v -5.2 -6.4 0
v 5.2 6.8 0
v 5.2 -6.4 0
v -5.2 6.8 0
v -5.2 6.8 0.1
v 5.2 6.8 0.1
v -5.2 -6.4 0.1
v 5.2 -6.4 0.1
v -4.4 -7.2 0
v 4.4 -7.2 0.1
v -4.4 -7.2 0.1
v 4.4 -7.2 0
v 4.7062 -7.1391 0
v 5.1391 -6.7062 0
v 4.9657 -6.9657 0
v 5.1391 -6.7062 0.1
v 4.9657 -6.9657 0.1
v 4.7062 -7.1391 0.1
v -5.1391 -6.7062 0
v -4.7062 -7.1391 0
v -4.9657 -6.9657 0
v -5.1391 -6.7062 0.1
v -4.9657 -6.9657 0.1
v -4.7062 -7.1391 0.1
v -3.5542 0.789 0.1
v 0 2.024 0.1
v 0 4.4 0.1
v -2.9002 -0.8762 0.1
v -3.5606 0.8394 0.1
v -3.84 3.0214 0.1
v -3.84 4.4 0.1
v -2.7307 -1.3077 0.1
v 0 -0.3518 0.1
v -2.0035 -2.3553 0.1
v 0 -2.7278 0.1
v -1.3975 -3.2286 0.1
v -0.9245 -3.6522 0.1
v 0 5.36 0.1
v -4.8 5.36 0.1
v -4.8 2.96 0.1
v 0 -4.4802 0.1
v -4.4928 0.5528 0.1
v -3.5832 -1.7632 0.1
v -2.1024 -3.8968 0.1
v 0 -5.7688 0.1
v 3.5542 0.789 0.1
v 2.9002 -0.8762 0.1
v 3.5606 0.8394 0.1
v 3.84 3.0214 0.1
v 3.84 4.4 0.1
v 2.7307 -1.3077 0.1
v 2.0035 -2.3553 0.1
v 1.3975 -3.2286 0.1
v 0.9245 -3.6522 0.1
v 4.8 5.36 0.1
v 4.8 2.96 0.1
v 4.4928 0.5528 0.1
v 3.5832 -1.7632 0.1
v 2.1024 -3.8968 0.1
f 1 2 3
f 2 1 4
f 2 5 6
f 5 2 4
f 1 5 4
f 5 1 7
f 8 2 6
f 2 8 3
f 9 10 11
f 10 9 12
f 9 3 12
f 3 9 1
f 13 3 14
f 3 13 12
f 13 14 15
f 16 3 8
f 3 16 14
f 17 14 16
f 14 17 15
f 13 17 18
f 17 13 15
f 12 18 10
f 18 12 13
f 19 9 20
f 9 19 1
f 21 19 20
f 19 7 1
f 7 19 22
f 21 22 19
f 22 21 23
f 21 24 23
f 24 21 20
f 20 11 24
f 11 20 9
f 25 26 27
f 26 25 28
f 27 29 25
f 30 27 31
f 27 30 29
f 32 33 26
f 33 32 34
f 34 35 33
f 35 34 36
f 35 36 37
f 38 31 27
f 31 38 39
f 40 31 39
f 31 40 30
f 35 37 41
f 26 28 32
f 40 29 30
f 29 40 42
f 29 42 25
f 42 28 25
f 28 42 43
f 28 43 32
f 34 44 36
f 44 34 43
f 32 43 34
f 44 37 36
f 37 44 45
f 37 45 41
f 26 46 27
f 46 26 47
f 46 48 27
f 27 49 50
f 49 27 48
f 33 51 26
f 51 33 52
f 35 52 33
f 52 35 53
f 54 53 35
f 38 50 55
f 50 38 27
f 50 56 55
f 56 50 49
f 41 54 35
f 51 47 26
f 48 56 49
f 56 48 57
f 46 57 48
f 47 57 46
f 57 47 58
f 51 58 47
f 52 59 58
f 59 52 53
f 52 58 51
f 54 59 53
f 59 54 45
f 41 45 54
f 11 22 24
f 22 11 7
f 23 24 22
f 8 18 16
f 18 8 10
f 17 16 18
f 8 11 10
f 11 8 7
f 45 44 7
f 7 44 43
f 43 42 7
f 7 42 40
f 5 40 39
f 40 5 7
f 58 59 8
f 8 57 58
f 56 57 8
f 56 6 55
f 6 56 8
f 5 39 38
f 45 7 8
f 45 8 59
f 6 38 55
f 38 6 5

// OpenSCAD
// file: ../p/1-4cyli.scad
use <../lib.scad>
function ldraw_lib__1_4cyli() = [
// 0 Cylinder 0.25
// 0 Name: 1-4cyli.dat
// 0 Author: James Jessiman
// 0 !LDRAW_ORG Primitive UPDATE 2012-01
// 0 !LICENSE Licensed under CC BY 4.0 : see CAreadme.txt
// 
// 0 BFC CERTIFY CCW
  [0,"BFC","CERTIFY"],
  [0,"BFC","CCW"],
// 
// 0 !HISTORY 2002-03-23 [sbliss] Added BFC statement.
// 0 !HISTORY 2002-04-25 [PTadmin] Official Update 2002-02
// 0 !HISTORY 2007-06-22 [PTadmin] Header formatted for Contributor Agreement
// 0 !HISTORY 2008-07-01 [PTadmin] Official Update 2008-01
// 0 !HISTORY 2012-02-16 [Philo] Changed to CCW
// 0 !HISTORY 2012-03-30 [PTadmin] Official Update 2012-01
// 
// 
// 4 16 1 1 0 0.9239 1 0.3827 0.9239 0 0.3827 1 0 0
  [4,16,1,1,0,0.9239,1,0.3827,0.9239,0,0.3827,1,0,0],
// 5 24 1 0 0 1 1 0 0.9239 0 0.3827 1 0 -1
  [5,24,1,0,0,1,1,0,0.9239,0,0.3827,1,0,-1],
// 4 16 0.9239 1 0.3827 0.7071 1 0.7071 0.7071 0 0.7071 0.9239 0 0.3827
  [4,16,0.9239,1,0.3827,0.7071,1,0.7071,0.7071,0,0.7071,0.9239,0,0.3827],
// 5 24 0.9239 0 0.3827 0.9239 1 0.3827 0.7071 0 0.7071 1 0 0
  [5,24,0.9239,0,0.3827,0.9239,1,0.3827,0.7071,0,0.7071,1,0,0],
// 4 16 0.7071 1 0.7071 0.3827 1 0.9239 0.3827 0 0.9239 0.7071 0 0.7071
  [4,16,0.7071,1,0.7071,0.3827,1,0.9239,0.3827,0,0.9239,0.7071,0,0.7071],
// 5 24 0.7071 0 0.7071 0.7071 1 0.7071 0.3827 0 0.9239 0.9239 0 0.3827
  [5,24,0.7071,0,0.7071,0.7071,1,0.7071,0.3827,0,0.9239,0.9239,0,0.3827],
// 4 16 0.3827 1 0.9239 0 1 1 0 0 1 0.3827 0 0.9239
  [4,16,0.3827,1,0.9239,0,1,1,0,0,1,0.3827,0,0.9239],
// 5 24 0.3827 0 0.9239 0.3827 1 0.9239 0 0 1 0.7071 0 0.7071
  [5,24,0.3827,0,0.9239,0.3827,1,0.9239,0,0,1,0.7071,0,0.7071],
// 5 24 0 0 1 0 1 1 0.3827 0 0.9239 -1 0 1
  [5,24,0,0,1,0,1,1,0.3827,0,0.9239,-1,0,1],
];
module ldraw_lib__1_4cyli(step=0, col=false, unit=2/5, alt=false, line=0.2, solid=!$preview)
    makepoly(ldraw_lib__1_4cyli(), step=step, col=col, unit=unit, alt=alt, line=line, solid=solid);
ldraw_lib__1_4cyli(line=0.2);
// file: s/3238s02.scad
use <../../lib.scad>
use <../../p/1-4chrd.scad>
use <../../p/1-4cyli.scad>
function ldraw_lib__s__3238s02() = [
// 0 ~Sticker Minifig Vest - box
// 0 Name: s\3238s02.dat
// 0 Author: Alex Taylor [anathema]
// 0 !LDRAW_ORG Subpart UPDATE 2020-03
// 0 !LICENSE Licensed under CC BY 4.0 : see CAreadme.txt
// 
// 0 BFC CERTIFY CCW
  [0,"BFC","CERTIFY"],
  [0,"BFC","CCW"],
// 
// 0 !HISTORY 2010-04-05 [PTadmin] Official Update 2010-01
// 0 !HISTORY 2020-11-01 [MMR1988] Fixed t-junctions
// 0 !HISTORY 2020-12-29 [PTadmin] Official Update 2020-03
// 
// 
// 4 16 13 0 17 13 0 -16 -13 0 -16 -13 0 17
  [4,16,13,0,17,13,0,-16,-13,0,-16,-13,0,17],
// 4 16 -13 -0.25 17 13 -0.25 17 13 0 17 -13 0 17
  [4,16,-13,-0.25,17,13,-0.25,17,13,0,17,-13,0,17],
// 4 16 -13 0 17 -13 0 -16 -13 -0.25 -16 -13 -0.25 17
  [4,16,-13,0,17,-13,0,-16,-13,-0.25,-16,-13,-0.25,17],
// 4 16 13 -0.25 17 13 -0.25 -16 13 0 -16 13 0 17
  [4,16,13,-0.25,17,13,-0.25,-16,13,0,-16,13,0,17],
// 4 16 -11 0 -18 11 0 -18 11 -0.25 -18 -11 -0.25 -18
  [4,16,-11,0,-18,11,0,-18,11,-0.25,-18,-11,-0.25,-18],
// 4 16 -13 0 -16 13 0 -16 11 0 -18 -11 0 -18
  [4,16,-13,0,-16,13,0,-16,11,0,-18,-11,0,-18],
// 1 16 11 0 -16 0 0 2 0 -1 0 -2 0 0 1-4chrd.dat
  [1,16,11,0,-16,0,0,2,0,-1,0,-2,0,0, ldraw_lib__1_4chrd()],
// 1 16 11 0 -16 2 0 0 0 -0.25 0 0 0 -2 1-4cyli.dat
  [1,16,11,0,-16,2,0,0,0,-0.25,0,0,0,-2, ldraw_lib__1_4cyli()],
// 1 16 -11 0 -16 0 0 -2 0 -1 0 -2 0 0 1-4chrd.dat
  [1,16,-11,0,-16,0,0,-2,0,-1,0,-2,0,0, ldraw_lib__1_4chrd()],
// 1 16 -11 0 -16 -2 0 0 0 -0.25 0 0 0 -2 1-4cyli.dat
  [1,16,-11,0,-16,-2,0,0,0,-0.25,0,0,0,-2, ldraw_lib__1_4cyli()],
];
module ldraw_lib__s__3238s02(step=0, col=false, unit=2/5, alt=false, line=0.2, solid=!$preview)
    makepoly(ldraw_lib__s__3238s02(), step=step, col=col, unit=unit, alt=alt, line=line, solid=solid);
ldraw_lib__s__3238s02(line=0.2);
// file: s/003238s5.scad
use <../../lib.scad>
function ldraw_lib__s__003238s5() = [
// 0 ~Green Chevron on Yellow Pattern - 1/2
// 0 Name: s\003238s5.dat
// 0 Author: Alex Taylor [anathema]
// 0 !LDRAW_ORG Subpart UPDATE 2020-03
// 0 !LICENSE Licensed under CC BY 4.0 : see CAreadme.txt
// 
// 0 BFC CERTIFY CCW
  [0,"BFC","CERTIFY"],
  [0,"BFC","CCW"],
// 
// 0 !HISTORY 2010-04-05 [PTadmin] Official Update 2010-01
// 0 !HISTORY 2020-10-30 [MMR1988] Removed T-junctions
// 0 !HISTORY 2020-12-29 [PTadmin] Official Update 2020-03
// 
// 
// 4 2 -14.809 0 -5.046 -12.084 0 -11.984 0 0 0.1 0 0 10
  [4,2,-14.809,0,-5.046,-12.084,0,-11.984,0,0,0.1,0,0,10],
// 3 2 0 0 10 -14.836 0 -4.836 -14.809 0 -5.046
  [3,2,0,0,10,-14.836,0,-4.836,-14.809,0,-5.046],
// 4 14 -16 0 10 -16 0 4.256 -14.836 0 -4.836 0 0 10
  [4,14,-16,0,10,-16,0,4.256,-14.836,0,-4.836,0,0,10],
// 4 14 -11.378 0 -13.782 -8.348 0 -18.147 0 0 -9.799 0 0 0.1
  [4,14,-11.378,0,-13.782,-8.348,0,-18.147,0,0,-9.799,0,0,0.1],
// 4 2 0 0 -9.799 -8.348 0 -18.147 -5.823 0 -21.786 0 0 -19.699
  [4,2,0,0,-9.799,-8.348,0,-18.147,-5.823,0,-21.786,0,0,-19.699],
// 3 2 0 0 -19.699 -5.823 0 -21.786 -3.852 0 -23.551
  [3,2,0,0,-19.699,-5.823,0,-21.786,-3.852,0,-23.551],
// 4 16 0 0 10 0 0 14 -20 0 14 -16 0 10
  [4,16,0,0,10,0,0,14,-20,0,14,-16,0,10],
// 4 16 -16 0 4.256 -16 0 10 -20 0 14 -20 0 4
  [4,16,-16,0,4.256,-16,0,10,-20,0,14,-20,0,4],
// 3 14 0 0 -19.699 -3.852 0 -23.551 0 0 -27.001
  [3,14,0,0,-19.699,-3.852,0,-23.551,0,0,-27.001],
// 3 14 0 0 0.1 -12.084 0 -11.984 -11.378 0 -13.782
  [3,14,0,0,0.1,-12.084,0,-11.984,-11.378,0,-13.782],
// 4 16 -20 0 4 -18.72 0 -6.03 -14.836 0 -4.836 -16 0 4.256
  [4,16,-20,0,4,-18.72,0,-6.03,-14.836,0,-4.836,-16,0,4.256],
// 3 16 -14.836 0 -4.836 -18.72 0 -6.03 -14.809 0 -5.046
  [3,16,-14.836,0,-4.836,-18.72,0,-6.03,-14.809,0,-5.046],
// 4 16 -18.72 0 -6.03 -14.93 0 -15.68 -12.084 0 -11.984 -14.809 0 -5.046
  [4,16,-18.72,0,-6.03,-14.93,0,-15.68,-12.084,0,-11.984,-14.809,0,-5.046],
// 3 16 -12.084 0 -11.984 -14.93 0 -15.68 -11.378 0 -13.782
  [3,16,-12.084,0,-11.984,-14.93,0,-15.68,-11.378,0,-13.782],
// 4 16 -8.348 0 -18.147 -14.93 0 -15.68 -8.76 0 -24.57 -5.823 0 -21.786
  [4,16,-8.348,0,-18.147,-14.93,0,-15.68,-8.76,0,-24.57,-5.823,0,-21.786],
// 3 16 -11.378 0 -13.782 -14.93 0 -15.68 -8.348 0 -18.147
  [3,16,-11.378,0,-13.782,-14.93,0,-15.68,-8.348,0,-18.147],
// 4 16 -3.852 0 -23.551 -5.823 0 -21.786 -8.76 0 -24.57 0 0 -32.37
  [4,16,-3.852,0,-23.551,-5.823,0,-21.786,-8.76,0,-24.57,0,0,-32.37],
// 3 16 -3.852 0 -23.551 0 0 -32.37 0 0 -27.001
  [3,16,-3.852,0,-23.551,0,0,-32.37,0,0,-27.001],
];
module ldraw_lib__s__003238s5(step=0, col=false, unit=2/5, alt=false, line=0.2, solid=!$preview)
    makepoly(ldraw_lib__s__003238s5(), step=step, col=col, unit=unit, alt=alt, line=line, solid=solid);
ldraw_lib__s__003238s5(line=0.2);
// file: ../p/1-4chrd.scad
use <../lib.scad>
function ldraw_lib__1_4chrd() = [
// 0 Chord 0.25
// 0 Name: 1-4chrd.dat
// 0 Author: Max Martin Richter [MMR1988]
// 0 !LDRAW_ORG Primitive UPDATE 2023-05
// 0 !LICENSE Licensed under CC BY 4.0 : see CAreadme.txt
// 
// 0 BFC CERTIFY CCW
  [0,"BFC","CERTIFY"],
  [0,"BFC","CCW"],
// 
// 0 !HISTORY 2004-04-22 [PTadmin] Official Update 2004-02
// 0 !HISTORY 2007-10-09 [PTadmin] Header formatted for Contributor Agreement
// 0 !HISTORY 2008-07-01 [PTadmin] Official Update 2008-01
// 0 !HISTORY 2012-08-02 [MMR1988] Re-creation with PrimGen2 and Rectifier
// 0 !HISTORY 2012-08-09 [PTadmin] Official Update 2012-02
// 0 !HISTORY 2023-10-27 [OrionP] Change author to MMR1988 from hafhead
// 0 !HISTORY 2023-10-31 [OrionP] Official Update 2023-05
// 
// 4 16 0.9239 0 0.3827 0.3827 0 0.9239 0 0 1 1 0 0
  [4,16,0.9239,0,0.3827,0.3827,0,0.9239,0,0,1,1,0,0],
// 3 16 0.7071 0 0.7071 0.3827 0 0.9239 0.9239 0 0.3827
  [3,16,0.7071,0,0.7071,0.3827,0,0.9239,0.9239,0,0.3827],
];
module ldraw_lib__1_4chrd(step=0, col=false, unit=2/5, alt=false, line=0.2, solid=!$preview)
    makepoly(ldraw_lib__1_4chrd(), step=step, col=col, unit=unit, alt=alt, line=line, solid=solid);
ldraw_lib__1_4chrd(line=0.2);
// main file
use <../lib.scad>
use <../p/1-4chrd.scad>
use <s/003238s5.scad>
use <s/3238s02.scad>
function ldraw_lib__003238o() = [
// 0 Sticker Minifig Vest with Shield with Green Chevrons on Light Grey Background
// 0 Name: 003238o.dat
// 0 Author: Alex Taylor [anathema]
// 0 !LDRAW_ORG Part UPDATE 2020-03
// 0 !LICENSE Licensed under CC BY 4.0 : see CAreadme.txt
// 
// 0 BFC CERTIFY CCW
  [0,"BFC","CERTIFY"],
  [0,"BFC","CCW"],
// 
// 0 !KEYWORDS Castle, part 3840, set 375-2, set 6075-2
// 
// 0 !HISTORY 2010-04-05 [PTadmin] Official Update 2010-01
// 0 !HISTORY 2019-09-08 [anathema] Corrected colour of back
// 0 !HISTORY 2020-11-01 [MMR1988] Fixed overlapping and t-junctions
// 0 !HISTORY 2020-12-29 [PTadmin] Official Update 2020-03
// 
// 
// 1 16 0 0 0 1 0 0 0 1 0 0 0 1 s\3238s02.dat
  [1,16,0,0,0,1,0,0,0,1,0,0,0,1, ldraw_lib__s__3238s02()],
// 1 7 0 -0.25 5 0.6 0 0 0 1 0 0 0 0.6 s\003238s5.dat
  [1,7,0,-0.25,5,0.6,0,0,0,1,0,0,0,0.6, ldraw_lib__s__003238s5()],
// 1 7 0 -0.25 5 -0.6 0 0 0 1 0 0 0 0.6 s\003238s5.dat
  [1,7,0,-0.25,5,-0.6,0,0,0,1,0,0,0,0.6, ldraw_lib__s__003238s5()],
// 1 7 -11 -0.25 -16 -2 0 0 0 1 0 0 0 -2 1-4chrd.dat
  [1,7,-11,-0.25,-16,-2,0,0,0,1,0,0,0,-2, ldraw_lib__1_4chrd()],
// 1 7 11 -0.25 -16 0 0 2 0 1 0 -2 0 0 1-4chrd.dat
  [1,7,11,-0.25,-16,0,0,2,0,1,0,-2,0,0, ldraw_lib__1_4chrd()],
// 4 7 -11 -.25 -18 11 -.25 -18 13 -.25 -16 -13 -.25 -16
  [4,7,-11,-.25,-18,11,-.25,-18,13,-.25,-16,-13,-.25,-16],
// 3 7 0 -.25 -14.422 -5.256 -.25 -9.742 -13 -.25 -16
  [3,7,0,-.25,-14.422,-5.256,-.25,-9.742,-13,-.25,-16],
// 3 7 -13 -.25 -16 -5.256 -.25 -9.742 -8.958 -.25 -4.408
  [3,7,-13,-.25,-16,-5.256,-.25,-9.742,-8.958,-.25,-4.408],
// 3 7 -8.958 -.25 -4.408 -11.232 -.25 1.382 -13 -.25 -16
  [3,7,-8.958,-.25,-4.408,-11.232,-.25,1.382,-13,-.25,-16],
// 3 7 -13 -.25 -16 -11.232 -.25 1.382 -12 -.25 7.4
  [3,7,-13,-.25,-16,-11.232,-.25,1.382,-12,-.25,7.4],
// 4 7 -12 -.25 7.4 -12 -.25 13.4 -13 -.25 17 -13 -.25 -16
  [4,7,-12,-.25,7.4,-12,-.25,13.4,-13,-.25,17,-13,-.25,-16],
// 3 7 8.958 -.25 -4.408 5.256 -.25 -9.742 13 -.25 -16
  [3,7,8.958,-.25,-4.408,5.256,-.25,-9.742,13,-.25,-16],
// 3 7 13 -.25 -16 11.232 -.25 1.382 8.958 -.25 -4.408
  [3,7,13,-.25,-16,11.232,-.25,1.382,8.958,-.25,-4.408],
// 3 7 12 -.25 7.4 11.232 -.25 1.382 13 -.25 -16
  [3,7,12,-.25,7.4,11.232,-.25,1.382,13,-.25,-16],
// 4 7 13 -.25 -16 13 -.25 17 12 -.25 13.4 12 -.25 7.4
  [4,7,13,-.25,-16,13,-.25,17,12,-.25,13.4,12,-.25,7.4],
// 3 7 -13 -.25 17 -12 -.25 13.4 0 -.25 13.4
  [3,7,-13,-.25,17,-12,-.25,13.4,0,-.25,13.4],
// 3 7 0 -.25 -14.422 -13 -.25 -16 13 -.25 -16
  [3,7,0,-.25,-14.422,-13,-.25,-16,13,-.25,-16],
// 3 7 0 -.25 -14.422 13 -.25 -16 5.256 -.25 -9.742
  [3,7,0,-.25,-14.422,13,-.25,-16,5.256,-.25,-9.742],
// 4 7 -13 -.25 17 0 -.25 13.4 12 -.25 13.4 13 -.25 17
  [4,7,-13,-.25,17,0,-.25,13.4,12,-.25,13.4,13,-.25,17],
];
module ldraw_lib__003238o(step=0, col=false, unit=2/5, alt=false, line=0.2, solid=!$preview)
    makepoly(ldraw_lib__003238o(), step=step, col=col, unit=unit, alt=alt, line=line, solid=solid);
ldraw_lib__003238o(line=0.2);
